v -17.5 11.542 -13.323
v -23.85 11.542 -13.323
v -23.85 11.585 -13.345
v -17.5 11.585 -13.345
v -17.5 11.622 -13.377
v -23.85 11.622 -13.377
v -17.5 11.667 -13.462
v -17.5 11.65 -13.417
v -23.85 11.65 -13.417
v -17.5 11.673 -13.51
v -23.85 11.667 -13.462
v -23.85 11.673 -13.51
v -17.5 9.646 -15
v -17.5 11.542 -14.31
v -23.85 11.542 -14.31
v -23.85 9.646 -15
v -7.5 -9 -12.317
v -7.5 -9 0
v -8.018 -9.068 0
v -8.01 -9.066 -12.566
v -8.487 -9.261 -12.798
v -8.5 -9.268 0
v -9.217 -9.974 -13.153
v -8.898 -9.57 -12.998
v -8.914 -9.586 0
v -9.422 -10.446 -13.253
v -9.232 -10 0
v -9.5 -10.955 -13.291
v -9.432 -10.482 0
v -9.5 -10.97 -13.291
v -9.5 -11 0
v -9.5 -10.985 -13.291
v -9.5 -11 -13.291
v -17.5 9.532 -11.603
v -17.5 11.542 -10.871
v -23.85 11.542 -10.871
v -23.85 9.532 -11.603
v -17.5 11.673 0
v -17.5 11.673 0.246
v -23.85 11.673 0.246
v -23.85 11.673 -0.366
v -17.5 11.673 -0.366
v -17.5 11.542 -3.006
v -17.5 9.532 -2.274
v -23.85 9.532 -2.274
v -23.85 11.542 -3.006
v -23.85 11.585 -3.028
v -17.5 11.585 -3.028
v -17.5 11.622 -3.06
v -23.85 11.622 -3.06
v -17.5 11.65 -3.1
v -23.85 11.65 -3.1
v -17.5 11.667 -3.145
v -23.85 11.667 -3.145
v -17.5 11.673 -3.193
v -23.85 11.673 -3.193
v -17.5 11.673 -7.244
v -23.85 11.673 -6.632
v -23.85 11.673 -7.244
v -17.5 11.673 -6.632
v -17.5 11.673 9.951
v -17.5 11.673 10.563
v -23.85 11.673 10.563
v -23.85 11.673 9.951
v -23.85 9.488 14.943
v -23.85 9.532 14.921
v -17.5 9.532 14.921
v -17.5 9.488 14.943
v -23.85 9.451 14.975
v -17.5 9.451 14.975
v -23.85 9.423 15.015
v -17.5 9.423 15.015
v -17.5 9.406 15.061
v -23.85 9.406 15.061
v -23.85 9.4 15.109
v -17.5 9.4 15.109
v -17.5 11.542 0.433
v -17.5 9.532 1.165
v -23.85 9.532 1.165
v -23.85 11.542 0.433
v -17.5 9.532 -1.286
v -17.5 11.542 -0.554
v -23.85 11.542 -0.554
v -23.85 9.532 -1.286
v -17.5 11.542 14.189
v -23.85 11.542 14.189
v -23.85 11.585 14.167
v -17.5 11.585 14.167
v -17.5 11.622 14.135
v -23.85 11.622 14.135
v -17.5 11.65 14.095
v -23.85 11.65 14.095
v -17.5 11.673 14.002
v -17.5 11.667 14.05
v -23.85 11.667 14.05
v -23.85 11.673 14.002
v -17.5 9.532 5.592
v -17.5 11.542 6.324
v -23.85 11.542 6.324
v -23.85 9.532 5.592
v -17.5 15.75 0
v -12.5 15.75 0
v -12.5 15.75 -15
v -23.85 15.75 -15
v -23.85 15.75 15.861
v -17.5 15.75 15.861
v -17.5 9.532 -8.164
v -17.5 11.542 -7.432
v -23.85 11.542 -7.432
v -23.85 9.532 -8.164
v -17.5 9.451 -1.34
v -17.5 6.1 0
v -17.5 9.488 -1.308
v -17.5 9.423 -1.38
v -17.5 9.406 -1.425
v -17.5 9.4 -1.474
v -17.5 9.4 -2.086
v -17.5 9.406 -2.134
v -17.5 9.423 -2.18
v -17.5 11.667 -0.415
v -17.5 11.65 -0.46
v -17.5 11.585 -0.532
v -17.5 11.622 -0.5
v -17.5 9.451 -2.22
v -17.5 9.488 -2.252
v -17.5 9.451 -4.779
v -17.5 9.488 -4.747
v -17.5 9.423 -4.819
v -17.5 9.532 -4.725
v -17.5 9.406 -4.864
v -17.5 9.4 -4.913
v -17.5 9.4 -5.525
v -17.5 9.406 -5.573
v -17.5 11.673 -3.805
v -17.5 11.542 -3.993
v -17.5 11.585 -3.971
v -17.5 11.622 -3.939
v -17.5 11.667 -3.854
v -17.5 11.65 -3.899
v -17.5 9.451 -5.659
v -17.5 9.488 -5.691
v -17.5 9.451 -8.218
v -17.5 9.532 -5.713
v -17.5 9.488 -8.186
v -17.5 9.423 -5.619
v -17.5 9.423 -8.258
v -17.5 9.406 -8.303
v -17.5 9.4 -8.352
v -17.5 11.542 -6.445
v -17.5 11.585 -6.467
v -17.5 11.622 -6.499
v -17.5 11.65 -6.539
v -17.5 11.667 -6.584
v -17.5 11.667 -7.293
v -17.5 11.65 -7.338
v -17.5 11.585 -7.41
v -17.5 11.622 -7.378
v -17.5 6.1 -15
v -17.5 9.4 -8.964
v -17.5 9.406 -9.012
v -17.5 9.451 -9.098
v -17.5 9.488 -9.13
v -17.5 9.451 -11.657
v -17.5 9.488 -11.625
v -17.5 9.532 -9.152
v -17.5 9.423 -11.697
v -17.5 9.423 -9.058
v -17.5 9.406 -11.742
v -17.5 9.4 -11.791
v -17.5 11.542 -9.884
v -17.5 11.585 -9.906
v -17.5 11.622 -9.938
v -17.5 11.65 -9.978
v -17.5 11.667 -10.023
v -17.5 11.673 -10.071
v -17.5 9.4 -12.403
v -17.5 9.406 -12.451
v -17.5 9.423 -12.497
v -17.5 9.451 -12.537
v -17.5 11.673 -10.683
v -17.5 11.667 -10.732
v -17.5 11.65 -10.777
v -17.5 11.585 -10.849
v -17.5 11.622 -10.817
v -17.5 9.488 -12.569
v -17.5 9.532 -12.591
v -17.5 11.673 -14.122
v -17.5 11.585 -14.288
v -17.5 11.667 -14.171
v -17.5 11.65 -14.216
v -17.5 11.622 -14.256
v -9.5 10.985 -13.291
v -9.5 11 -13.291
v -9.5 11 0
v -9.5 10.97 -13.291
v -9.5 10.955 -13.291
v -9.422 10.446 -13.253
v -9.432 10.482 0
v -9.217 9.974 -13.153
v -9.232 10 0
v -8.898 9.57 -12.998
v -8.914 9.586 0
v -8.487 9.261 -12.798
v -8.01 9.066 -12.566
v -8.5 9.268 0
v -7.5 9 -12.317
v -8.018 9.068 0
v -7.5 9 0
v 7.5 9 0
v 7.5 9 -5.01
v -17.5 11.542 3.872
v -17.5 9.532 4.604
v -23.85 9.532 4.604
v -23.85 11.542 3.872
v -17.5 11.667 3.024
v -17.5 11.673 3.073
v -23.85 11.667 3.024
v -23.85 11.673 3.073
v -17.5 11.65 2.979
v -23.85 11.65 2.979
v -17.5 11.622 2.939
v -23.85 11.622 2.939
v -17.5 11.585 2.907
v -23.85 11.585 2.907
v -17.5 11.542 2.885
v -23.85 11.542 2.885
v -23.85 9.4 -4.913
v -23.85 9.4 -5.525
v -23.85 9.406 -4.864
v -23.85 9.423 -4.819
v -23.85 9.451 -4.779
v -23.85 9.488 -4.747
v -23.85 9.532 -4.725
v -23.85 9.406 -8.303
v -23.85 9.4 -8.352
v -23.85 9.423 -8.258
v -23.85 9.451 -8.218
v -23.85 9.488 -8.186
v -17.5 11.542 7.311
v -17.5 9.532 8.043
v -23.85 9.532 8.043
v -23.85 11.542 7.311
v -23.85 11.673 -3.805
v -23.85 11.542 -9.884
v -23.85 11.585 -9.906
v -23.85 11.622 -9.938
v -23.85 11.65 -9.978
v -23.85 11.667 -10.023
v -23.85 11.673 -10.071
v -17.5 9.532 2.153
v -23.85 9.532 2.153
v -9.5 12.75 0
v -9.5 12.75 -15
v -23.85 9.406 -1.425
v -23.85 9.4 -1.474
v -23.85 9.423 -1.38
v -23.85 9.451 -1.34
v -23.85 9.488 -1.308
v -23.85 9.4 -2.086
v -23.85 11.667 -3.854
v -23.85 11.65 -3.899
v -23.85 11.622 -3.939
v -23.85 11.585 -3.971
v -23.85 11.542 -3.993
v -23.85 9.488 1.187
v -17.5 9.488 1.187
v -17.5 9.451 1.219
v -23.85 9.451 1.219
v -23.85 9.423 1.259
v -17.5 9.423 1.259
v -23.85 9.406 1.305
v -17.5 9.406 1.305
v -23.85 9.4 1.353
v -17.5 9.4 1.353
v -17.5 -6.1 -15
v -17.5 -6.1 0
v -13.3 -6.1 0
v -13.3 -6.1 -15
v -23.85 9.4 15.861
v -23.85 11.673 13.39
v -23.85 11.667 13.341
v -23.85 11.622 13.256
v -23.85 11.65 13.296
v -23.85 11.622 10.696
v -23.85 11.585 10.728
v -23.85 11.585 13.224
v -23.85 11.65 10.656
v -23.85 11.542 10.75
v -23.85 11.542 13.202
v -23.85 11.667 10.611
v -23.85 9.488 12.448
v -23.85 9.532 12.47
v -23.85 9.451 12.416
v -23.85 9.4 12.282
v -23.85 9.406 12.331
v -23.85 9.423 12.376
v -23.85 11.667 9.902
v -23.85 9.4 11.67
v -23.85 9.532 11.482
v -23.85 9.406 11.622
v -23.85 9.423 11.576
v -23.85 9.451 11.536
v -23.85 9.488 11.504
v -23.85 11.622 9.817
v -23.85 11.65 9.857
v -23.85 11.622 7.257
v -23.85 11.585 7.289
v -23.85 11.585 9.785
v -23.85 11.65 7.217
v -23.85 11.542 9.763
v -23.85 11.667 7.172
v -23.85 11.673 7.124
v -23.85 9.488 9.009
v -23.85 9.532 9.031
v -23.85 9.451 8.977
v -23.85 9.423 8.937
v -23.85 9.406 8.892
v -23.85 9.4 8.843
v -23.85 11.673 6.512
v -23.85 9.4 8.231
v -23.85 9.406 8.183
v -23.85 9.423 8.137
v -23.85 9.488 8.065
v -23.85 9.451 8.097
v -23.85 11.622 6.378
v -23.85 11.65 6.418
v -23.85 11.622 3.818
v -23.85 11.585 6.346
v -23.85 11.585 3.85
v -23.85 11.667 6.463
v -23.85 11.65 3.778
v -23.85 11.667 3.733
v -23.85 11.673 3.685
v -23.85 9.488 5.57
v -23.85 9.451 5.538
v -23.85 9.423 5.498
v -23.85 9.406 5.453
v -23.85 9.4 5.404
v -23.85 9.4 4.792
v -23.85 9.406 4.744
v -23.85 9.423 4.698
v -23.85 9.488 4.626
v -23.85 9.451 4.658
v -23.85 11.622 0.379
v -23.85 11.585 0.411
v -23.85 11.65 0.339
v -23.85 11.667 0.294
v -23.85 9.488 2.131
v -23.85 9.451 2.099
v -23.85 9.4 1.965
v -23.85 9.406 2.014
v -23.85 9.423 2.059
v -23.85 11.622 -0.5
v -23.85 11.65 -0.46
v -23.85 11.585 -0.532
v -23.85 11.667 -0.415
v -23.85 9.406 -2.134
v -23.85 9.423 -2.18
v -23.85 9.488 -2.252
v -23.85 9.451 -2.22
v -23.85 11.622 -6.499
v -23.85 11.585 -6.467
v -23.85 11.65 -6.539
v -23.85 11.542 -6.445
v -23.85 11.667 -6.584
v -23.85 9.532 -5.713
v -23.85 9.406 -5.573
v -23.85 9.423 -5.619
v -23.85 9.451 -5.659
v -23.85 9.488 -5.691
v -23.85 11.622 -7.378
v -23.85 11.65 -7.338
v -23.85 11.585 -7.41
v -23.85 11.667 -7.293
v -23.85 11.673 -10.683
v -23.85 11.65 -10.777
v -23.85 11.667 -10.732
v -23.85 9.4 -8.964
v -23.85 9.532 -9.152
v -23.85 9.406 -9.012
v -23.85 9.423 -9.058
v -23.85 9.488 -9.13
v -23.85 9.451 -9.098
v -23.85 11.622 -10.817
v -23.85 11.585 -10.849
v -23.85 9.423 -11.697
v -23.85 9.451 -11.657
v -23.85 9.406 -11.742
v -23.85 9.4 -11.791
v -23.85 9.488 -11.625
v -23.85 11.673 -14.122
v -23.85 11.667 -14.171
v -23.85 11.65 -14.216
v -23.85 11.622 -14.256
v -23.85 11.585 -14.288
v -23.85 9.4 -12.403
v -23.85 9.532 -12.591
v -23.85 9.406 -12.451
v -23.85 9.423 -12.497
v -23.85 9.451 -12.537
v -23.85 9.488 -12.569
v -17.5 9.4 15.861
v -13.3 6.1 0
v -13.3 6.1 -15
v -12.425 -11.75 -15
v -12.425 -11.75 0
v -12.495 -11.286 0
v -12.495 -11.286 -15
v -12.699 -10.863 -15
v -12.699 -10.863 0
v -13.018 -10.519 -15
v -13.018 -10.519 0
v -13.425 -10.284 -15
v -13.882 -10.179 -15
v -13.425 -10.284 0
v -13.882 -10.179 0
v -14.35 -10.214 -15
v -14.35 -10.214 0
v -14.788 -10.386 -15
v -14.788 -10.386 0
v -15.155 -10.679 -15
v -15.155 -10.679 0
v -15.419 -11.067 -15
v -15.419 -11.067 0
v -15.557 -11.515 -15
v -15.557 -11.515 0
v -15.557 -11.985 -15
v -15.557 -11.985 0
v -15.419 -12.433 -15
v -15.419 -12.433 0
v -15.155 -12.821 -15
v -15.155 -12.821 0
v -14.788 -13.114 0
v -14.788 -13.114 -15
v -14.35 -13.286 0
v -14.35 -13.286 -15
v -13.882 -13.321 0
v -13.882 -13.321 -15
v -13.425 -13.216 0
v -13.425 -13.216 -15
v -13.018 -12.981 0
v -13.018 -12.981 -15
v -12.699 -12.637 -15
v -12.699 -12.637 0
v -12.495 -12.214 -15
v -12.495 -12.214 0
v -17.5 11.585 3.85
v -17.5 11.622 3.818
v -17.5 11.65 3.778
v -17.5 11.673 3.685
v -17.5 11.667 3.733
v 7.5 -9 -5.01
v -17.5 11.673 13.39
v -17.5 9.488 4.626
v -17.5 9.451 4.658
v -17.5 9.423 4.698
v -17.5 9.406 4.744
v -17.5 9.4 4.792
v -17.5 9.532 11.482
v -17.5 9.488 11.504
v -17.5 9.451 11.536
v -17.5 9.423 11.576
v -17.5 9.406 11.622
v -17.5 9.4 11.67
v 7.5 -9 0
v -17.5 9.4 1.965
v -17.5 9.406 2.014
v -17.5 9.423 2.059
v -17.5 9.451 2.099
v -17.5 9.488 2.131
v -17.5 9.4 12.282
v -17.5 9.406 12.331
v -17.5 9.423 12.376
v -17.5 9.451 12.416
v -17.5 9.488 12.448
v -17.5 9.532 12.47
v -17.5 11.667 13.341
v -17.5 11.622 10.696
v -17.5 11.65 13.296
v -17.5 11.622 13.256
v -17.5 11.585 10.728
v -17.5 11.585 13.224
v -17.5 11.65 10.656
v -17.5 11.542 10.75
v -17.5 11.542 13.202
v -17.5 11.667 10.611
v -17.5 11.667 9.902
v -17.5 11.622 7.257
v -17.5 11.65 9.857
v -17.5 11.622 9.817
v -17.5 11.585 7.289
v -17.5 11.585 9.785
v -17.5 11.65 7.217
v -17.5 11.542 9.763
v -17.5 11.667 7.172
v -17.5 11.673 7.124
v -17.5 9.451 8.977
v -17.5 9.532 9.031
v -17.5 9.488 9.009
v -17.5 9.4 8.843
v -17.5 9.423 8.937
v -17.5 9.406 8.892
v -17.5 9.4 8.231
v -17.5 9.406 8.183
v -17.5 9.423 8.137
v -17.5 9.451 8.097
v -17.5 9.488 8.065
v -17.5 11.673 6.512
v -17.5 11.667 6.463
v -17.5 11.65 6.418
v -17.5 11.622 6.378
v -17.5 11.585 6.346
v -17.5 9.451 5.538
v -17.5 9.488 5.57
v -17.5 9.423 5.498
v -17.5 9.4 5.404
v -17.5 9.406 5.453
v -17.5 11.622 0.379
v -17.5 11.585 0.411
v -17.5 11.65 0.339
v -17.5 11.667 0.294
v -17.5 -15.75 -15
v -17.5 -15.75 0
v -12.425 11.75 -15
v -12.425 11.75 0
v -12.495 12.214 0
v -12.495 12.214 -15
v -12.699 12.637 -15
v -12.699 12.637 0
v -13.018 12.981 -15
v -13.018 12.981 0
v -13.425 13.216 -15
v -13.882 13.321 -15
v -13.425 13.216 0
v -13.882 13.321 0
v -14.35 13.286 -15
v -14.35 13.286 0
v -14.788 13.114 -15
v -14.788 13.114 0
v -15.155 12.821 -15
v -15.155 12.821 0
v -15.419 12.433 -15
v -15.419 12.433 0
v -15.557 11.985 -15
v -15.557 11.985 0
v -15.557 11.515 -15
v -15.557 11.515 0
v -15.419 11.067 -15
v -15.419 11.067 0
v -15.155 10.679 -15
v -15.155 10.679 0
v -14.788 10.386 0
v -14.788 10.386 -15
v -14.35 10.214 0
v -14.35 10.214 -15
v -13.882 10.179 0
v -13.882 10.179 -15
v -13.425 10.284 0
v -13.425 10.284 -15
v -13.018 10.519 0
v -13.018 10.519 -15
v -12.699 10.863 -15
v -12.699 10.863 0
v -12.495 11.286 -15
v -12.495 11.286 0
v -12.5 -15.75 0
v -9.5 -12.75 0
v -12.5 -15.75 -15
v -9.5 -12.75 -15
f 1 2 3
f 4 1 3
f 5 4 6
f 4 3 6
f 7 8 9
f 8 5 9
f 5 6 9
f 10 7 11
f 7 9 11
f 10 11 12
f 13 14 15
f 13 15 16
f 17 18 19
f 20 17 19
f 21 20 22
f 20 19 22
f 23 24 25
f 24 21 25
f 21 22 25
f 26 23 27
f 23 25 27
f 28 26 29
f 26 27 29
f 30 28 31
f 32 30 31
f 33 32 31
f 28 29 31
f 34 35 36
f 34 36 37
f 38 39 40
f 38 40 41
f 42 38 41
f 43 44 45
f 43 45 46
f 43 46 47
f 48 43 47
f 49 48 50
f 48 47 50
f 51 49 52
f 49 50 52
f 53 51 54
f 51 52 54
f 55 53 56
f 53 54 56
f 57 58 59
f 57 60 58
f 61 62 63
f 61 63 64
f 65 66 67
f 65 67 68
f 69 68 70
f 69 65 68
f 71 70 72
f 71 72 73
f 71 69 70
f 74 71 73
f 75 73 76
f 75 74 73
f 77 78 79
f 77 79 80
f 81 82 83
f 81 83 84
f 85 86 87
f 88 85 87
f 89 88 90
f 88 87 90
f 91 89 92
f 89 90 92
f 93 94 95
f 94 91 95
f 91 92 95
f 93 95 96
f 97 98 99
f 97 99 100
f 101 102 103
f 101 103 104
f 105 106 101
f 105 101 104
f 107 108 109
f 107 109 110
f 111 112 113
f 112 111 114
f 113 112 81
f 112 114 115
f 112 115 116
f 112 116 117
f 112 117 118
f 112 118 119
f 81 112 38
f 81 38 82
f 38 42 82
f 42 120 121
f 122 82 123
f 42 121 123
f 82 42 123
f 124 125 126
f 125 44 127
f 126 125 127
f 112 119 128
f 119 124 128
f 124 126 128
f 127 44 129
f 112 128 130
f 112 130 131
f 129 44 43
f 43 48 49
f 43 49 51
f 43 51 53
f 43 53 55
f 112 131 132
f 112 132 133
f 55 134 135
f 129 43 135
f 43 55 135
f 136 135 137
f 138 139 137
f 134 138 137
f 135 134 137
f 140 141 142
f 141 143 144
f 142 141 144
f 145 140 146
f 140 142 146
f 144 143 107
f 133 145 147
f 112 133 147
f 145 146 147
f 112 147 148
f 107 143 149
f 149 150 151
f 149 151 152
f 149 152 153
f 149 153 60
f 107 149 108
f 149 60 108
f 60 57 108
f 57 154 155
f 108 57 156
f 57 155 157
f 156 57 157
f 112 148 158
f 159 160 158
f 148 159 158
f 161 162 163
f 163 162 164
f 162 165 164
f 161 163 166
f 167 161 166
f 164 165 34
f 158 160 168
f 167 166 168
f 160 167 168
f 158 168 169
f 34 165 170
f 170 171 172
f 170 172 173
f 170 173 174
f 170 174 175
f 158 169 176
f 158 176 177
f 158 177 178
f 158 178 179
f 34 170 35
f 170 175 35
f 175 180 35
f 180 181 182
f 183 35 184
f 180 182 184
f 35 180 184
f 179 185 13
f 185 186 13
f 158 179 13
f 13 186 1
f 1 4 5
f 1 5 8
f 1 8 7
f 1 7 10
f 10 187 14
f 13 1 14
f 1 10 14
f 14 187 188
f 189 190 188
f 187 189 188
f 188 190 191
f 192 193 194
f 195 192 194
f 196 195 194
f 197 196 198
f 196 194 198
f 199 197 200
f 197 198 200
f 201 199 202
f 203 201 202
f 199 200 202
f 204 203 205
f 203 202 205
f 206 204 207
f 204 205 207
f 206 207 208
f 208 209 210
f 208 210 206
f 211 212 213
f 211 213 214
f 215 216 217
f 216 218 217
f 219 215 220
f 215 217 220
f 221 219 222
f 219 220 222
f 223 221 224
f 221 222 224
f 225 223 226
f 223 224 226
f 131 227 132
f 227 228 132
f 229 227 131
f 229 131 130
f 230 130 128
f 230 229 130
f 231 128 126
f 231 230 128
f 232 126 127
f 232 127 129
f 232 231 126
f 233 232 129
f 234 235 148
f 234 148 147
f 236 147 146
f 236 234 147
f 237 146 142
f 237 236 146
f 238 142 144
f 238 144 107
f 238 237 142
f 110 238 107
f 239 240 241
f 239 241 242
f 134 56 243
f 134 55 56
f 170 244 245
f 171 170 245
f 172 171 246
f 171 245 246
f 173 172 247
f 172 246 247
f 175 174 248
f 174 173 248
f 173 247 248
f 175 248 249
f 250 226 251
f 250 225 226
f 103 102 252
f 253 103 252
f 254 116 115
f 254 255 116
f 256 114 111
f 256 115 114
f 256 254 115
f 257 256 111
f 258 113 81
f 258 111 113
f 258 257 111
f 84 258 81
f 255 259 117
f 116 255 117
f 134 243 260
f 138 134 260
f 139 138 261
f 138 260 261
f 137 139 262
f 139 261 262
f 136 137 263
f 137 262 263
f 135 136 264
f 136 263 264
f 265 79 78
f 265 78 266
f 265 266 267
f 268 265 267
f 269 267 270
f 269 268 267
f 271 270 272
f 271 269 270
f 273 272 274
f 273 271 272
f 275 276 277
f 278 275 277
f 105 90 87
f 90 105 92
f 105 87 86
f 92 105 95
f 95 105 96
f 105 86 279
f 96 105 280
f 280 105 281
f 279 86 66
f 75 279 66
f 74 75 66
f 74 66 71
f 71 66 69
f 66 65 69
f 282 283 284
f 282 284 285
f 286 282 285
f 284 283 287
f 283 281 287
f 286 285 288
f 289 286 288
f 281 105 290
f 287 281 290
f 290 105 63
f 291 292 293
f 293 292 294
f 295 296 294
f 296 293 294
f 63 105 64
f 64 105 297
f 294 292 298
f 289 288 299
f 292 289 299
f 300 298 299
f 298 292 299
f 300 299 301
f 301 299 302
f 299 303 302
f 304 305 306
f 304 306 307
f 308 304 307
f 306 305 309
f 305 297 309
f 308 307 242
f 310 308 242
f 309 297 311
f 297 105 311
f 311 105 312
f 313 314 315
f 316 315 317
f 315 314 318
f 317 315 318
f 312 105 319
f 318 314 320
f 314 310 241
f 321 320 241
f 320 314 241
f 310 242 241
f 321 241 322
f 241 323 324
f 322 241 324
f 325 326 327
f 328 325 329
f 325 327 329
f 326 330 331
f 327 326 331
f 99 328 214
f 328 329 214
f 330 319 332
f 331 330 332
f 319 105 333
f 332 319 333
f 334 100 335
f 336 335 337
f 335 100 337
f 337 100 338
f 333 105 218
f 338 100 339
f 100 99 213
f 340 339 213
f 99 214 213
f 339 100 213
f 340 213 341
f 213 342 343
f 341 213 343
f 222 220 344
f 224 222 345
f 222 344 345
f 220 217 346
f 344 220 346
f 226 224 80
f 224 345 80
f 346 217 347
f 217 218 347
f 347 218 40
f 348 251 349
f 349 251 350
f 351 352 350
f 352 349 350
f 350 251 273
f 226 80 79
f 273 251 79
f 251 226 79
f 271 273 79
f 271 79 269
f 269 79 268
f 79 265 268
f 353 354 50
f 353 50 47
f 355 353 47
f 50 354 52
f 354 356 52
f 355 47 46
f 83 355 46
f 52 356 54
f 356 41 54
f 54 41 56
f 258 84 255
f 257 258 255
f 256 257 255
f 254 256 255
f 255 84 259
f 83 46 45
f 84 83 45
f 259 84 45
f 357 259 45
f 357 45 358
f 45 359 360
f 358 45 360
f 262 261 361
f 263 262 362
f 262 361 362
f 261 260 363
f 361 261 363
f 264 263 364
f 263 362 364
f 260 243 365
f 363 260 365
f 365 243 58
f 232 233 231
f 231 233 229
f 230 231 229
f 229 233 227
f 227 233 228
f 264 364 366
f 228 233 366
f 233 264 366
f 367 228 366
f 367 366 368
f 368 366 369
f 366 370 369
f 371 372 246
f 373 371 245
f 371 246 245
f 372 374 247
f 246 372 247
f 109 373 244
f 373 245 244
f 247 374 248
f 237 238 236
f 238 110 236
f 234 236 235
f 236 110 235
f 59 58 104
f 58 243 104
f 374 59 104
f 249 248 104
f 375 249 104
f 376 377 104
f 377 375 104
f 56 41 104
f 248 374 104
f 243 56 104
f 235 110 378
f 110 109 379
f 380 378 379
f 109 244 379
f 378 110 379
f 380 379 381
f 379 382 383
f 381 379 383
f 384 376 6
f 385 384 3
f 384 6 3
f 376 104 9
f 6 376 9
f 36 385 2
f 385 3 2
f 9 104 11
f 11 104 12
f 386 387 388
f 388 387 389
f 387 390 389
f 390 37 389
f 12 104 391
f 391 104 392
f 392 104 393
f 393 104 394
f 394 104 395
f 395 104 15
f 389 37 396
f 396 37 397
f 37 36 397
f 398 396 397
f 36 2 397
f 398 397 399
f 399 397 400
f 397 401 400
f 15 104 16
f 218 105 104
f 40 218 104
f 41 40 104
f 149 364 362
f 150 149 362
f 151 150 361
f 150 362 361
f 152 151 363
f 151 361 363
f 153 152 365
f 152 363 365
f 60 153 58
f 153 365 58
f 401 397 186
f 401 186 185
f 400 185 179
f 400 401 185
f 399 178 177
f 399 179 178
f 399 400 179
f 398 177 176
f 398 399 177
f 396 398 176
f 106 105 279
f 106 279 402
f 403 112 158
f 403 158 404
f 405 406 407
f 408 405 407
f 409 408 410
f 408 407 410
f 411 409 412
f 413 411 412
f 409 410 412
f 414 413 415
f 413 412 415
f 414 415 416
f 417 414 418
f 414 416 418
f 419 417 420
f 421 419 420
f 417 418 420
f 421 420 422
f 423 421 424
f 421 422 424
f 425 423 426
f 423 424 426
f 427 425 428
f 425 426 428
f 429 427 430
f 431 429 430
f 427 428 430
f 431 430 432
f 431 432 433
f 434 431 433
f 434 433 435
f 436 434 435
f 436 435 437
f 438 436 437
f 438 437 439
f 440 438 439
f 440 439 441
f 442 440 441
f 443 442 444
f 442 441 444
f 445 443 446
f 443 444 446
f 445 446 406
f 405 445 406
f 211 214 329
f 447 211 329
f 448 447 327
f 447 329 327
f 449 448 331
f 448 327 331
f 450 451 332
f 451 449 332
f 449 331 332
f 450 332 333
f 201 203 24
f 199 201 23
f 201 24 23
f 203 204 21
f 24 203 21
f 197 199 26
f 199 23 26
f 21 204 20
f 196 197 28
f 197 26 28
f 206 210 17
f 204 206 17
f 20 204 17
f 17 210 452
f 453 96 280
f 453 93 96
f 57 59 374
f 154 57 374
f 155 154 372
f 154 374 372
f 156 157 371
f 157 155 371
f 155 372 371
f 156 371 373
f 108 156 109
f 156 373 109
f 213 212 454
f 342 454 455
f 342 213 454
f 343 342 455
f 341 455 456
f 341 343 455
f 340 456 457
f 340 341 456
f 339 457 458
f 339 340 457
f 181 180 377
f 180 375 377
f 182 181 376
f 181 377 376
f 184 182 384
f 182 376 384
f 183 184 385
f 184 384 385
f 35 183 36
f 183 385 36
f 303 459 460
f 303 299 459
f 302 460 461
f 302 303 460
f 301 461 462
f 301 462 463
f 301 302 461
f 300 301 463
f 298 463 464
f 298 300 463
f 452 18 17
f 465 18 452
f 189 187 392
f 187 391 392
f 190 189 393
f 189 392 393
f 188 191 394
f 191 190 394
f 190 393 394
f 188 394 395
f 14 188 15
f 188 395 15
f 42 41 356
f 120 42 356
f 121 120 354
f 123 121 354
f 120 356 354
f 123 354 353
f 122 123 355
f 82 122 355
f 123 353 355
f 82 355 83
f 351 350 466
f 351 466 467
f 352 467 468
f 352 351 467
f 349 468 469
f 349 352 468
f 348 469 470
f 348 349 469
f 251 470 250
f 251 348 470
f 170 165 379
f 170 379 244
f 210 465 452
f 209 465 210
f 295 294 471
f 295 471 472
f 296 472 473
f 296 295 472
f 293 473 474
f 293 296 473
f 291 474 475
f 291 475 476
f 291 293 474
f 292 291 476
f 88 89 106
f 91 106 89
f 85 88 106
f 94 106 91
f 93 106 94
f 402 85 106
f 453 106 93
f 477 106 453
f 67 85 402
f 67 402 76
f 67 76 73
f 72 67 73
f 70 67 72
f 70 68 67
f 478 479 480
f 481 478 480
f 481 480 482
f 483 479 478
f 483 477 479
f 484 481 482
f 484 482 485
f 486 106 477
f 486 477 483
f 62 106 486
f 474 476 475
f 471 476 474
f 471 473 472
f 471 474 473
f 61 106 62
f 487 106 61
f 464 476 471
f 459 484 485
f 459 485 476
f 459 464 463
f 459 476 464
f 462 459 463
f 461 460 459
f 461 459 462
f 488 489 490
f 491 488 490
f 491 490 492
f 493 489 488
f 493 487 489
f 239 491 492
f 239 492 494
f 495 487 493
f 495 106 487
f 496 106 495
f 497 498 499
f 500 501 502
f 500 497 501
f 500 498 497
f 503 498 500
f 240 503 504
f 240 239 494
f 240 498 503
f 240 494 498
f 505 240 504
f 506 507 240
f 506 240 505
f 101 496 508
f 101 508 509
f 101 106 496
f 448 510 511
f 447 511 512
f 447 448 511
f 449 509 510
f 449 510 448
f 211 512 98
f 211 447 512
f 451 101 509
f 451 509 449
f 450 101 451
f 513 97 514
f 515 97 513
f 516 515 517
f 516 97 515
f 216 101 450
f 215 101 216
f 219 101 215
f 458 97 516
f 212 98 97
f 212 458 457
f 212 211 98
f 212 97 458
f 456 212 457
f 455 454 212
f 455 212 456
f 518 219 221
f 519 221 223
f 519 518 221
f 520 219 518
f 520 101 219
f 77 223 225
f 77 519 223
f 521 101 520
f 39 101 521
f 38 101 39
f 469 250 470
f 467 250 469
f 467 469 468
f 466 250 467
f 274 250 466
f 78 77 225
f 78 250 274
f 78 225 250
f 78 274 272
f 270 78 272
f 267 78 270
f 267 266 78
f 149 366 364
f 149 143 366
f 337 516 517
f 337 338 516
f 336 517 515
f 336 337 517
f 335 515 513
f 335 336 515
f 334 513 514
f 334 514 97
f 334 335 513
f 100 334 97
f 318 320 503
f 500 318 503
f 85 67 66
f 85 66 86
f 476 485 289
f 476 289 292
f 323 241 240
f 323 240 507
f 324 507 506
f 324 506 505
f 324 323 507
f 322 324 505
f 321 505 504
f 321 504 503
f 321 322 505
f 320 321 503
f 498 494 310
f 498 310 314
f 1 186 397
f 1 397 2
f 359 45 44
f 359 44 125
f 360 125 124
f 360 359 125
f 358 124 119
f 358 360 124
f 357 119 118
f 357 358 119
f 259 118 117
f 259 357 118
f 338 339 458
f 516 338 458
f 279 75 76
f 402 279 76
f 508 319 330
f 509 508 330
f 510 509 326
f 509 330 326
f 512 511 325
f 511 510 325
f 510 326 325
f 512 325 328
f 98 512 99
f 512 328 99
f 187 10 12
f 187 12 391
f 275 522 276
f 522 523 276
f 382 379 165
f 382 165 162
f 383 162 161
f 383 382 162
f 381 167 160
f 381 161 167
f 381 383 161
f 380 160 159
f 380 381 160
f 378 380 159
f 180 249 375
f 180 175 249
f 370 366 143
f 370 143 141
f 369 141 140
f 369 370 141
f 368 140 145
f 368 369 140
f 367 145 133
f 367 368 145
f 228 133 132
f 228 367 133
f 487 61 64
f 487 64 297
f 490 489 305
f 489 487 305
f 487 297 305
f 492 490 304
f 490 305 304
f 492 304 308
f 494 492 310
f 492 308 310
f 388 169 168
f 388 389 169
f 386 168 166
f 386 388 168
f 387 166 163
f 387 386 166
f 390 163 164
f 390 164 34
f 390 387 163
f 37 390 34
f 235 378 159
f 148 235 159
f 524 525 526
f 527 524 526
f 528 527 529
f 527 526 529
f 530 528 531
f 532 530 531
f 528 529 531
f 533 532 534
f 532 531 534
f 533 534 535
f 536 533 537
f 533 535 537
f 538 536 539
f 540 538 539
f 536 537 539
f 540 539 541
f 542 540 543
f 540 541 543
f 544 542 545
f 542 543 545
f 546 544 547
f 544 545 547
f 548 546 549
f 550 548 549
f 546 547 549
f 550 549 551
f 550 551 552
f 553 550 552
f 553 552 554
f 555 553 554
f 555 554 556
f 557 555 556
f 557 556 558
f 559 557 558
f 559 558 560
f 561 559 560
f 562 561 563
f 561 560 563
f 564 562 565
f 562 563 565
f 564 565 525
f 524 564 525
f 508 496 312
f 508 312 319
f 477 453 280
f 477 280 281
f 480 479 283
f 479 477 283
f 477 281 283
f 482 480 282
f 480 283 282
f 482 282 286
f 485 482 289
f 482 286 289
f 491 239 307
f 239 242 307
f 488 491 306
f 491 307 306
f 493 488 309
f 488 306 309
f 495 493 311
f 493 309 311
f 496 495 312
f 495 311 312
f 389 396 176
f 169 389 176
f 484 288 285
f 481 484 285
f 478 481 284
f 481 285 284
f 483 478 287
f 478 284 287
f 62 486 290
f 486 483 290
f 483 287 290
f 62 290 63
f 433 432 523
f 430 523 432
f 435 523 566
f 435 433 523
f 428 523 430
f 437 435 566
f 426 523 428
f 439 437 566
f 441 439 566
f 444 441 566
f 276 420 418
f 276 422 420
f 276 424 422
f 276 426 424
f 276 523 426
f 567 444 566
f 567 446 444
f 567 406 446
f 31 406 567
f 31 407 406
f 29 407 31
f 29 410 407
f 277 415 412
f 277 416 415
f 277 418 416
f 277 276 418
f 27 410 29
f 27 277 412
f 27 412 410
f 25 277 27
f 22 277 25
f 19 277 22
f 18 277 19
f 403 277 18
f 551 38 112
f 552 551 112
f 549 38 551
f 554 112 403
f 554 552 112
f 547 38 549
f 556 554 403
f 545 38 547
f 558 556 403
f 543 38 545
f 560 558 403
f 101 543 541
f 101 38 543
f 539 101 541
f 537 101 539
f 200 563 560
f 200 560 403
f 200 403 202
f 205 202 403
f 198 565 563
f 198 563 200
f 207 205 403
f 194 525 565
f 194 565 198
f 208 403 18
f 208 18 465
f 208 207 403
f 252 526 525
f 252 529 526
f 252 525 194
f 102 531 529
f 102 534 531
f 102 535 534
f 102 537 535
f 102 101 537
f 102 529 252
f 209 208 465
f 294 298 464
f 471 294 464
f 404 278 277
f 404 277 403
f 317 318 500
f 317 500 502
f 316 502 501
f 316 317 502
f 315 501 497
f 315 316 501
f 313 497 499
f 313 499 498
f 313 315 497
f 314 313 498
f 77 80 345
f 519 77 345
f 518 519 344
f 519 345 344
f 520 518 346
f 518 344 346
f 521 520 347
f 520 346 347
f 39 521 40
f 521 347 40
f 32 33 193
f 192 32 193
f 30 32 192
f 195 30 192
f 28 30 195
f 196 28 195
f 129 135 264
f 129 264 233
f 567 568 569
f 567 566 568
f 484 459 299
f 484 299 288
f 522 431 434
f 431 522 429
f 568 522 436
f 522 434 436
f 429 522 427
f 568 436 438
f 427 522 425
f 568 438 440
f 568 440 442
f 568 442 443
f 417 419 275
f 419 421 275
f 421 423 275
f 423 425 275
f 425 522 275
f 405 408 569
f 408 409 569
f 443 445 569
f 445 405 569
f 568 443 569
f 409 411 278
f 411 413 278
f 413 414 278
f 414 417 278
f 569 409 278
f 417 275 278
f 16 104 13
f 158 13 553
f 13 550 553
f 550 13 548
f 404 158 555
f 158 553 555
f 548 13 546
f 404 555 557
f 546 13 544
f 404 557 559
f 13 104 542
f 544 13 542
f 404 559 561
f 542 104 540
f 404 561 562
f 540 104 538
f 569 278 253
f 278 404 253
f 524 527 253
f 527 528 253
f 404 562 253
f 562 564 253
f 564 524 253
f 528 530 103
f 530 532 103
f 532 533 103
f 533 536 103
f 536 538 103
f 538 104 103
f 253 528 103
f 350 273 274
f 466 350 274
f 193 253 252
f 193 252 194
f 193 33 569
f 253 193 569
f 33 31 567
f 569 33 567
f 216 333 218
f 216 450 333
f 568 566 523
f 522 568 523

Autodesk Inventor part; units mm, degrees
ref_plane "YZ Plane" through (0, 0, 0) normal (1, 0, 0) x (0, 1, 0)
ref_plane "XZ Plane" through (0, 0, 0) normal (0, 1, 0) x (-1, 0, 0)
sketch "Sketch1" plane through (0, 0, 0) normal (0, 0, 1) x (1, 0, 0)
  line L0 (-7.5, -9) -> (7.5, -9)
  line L1 (7.5, -9) -> (7.5, 9)
  line L2 (7.5, 9) -> (-7.5, 9)
  line L3 (-9.5, -11) -> (-9.5, -12.75)
  line L4 (-12.5, -15.75) -> (-17.5, -15.75)
  arc A0 (-7.5, -9) -> (-9.5, -11) centre (-7.5, -11) ccw
  line L5 (-12.5, -15.75) -> (-9.5, -12.75)
  line L6 (-17.5, -15.75) -> (-17.5, -6.1)
  line L7 (-17.5, -6.1) -> (-13.3, -6.1)
  line L8 (-13.3, -6.1) -> (-13.3, 0)
  line L9 (2.7531, 0) -> (-2.7531, 0) construction
  line L10 (-9.5, 11) -> (-9.5, 12.75)
  line L11 (-12.5, 15.75) -> (-17.5, 15.75)
  arc A1 (-9.5, 11) -> (-7.5, 9) centre (-7.5, 11) ccw
  line L12 (-12.5, 15.75) -> (-9.5, 12.75)
  line L13 (-17.5, 15.75) -> (-17.5, 6.1)
  line L14 (-17.5, 6.1) -> (-13.3, 6.1)
  line L15 (-13.3, 6.1) -> (-13.3, 0)
  circle A2 centre (-14, -11.75) radius 1.575
  circle A3 centre (-14, 11.75) radius 1.575
  line L16 (-17.5, 15.75) -> (-23.85, 15.75)
  line L17 (-23.85, 15.75) -> (-23.85, 9.4)
  line L18 (-23.85, 9.4) -> (-17.5, 9.4)
  line L19 (-9.5, 11.875) -> (-9.5, -11.875)
  point P0 (0, 0)
  point P1 (0, 0)
  point P2 (7.5, 0)
  point P3 (0, -9)
  point P4 (-9.5, -15.75)
  point P5 (0, 0)
  point P6 (-9.5, 15.75)
  dimension "d1" = 18
  dimension "d3" = 8
  dimension "d4" = 2
  dimension "d5" = 3
  dimension "d6" = 3
  dimension "d7" = 9.65
  dimension "d8" = 4.2
  dimension "d9" = 6.1
  dimension "d10" = 7.5
  dimension "d11" = 3.875
  dimension "d12" = 3.15
  dimension "d13" = 3.5
  dimension "d14" = 4
  dimension "d15" = 6.35
  dimension "d16" = 6.35
extrude "Extrusion1" add sketch "Sketch1" against normal blind 15 contours L3 L5 L4 L6 L7 L8 L15 L14 L13 L11 L12 L10 L19
extrude "Extrusion2" add sketch "Sketch1" against normal blind 13.291 contours A0 L19 A1 L2 L1 L0
chamfer "Chamfer1" distance 17 distance2 8.281 1 edges at (7.5, 0, -13.291) measured on face at (-2.5, 3, -13.291)
extrude "Extrusion3" add sketch "Sketch1" along normal blind 15.861 and the other way blind 15 contours L13 L18 L17 L16
ref_plane "Work Plane1" through (-17.5, 9.4, 0) normal (1, 0, 0) x (0, 0, -1)
sketch "Sketch2" plane through (-17.5, 9.4, 0) normal (1, 0, 0) x (0, 0, -1)
  line L0 (0, 6.35) -> (0, 0) projected
  line L1 (15, 0) -> (0, 0) projected
  line L2 (15, 6.35) -> (15, 0) projected
  line L3 (0, 6.35) -> (15, 6.35) projected
  line L4 (-15.861, 6.35) -> (0, 6.35) projected
  line L5 (-15.861, 0) -> (-15.861, 6.35) projected
  line L6 (0, 0) -> (-15.861, 0) projected
  line L7 (0, -3.3) -> (0, 0) projected
  line L8 (15, -3.3) -> (0, -3.3) projected
  line L9 (15, 0) -> (15, -3.3) projected
  line L10 (0, -15.5) -> (15, -15.5) projected
  line L11 (15, -15.5) -> (15, -25.15) projected
  line L12 (15, -25.15) -> (0, -25.15) projected
  line L13 (0, -25.15) -> (0, -15.5) projected
  line L14 (-15.861, 0) -> (-14.969, 0)
  line L15 (-14.969, 0) -> (-14.1416, 2.2732)
  line L16 (-14.1416, 2.2732) -> (-13.2496, 2.2732)
  line L17 (-13.2496, 2.2732) -> (-12.4223, 0)
  line L18 (-15.861, 0) -> (15, 0) projected
  line L19 (-9.8106, 2.2732) -> (-8.9833, 0)
  line L20 (-10.7026, 2.2732) -> (-9.8106, 2.2732)
  line L21 (-11.53, 0) -> (-10.7026, 2.2732)
  line L22 (-12.422, 0) -> (-11.53, 0)
  line L23 (-6.3716, 2.2732) -> (-5.5443, 0)
  line L24 (-7.2636, 2.2732) -> (-6.3716, 2.2732)
  line L25 (-8.091, 0) -> (-7.2636, 2.2732)
  line L26 (-8.983, 0) -> (-8.091, 0)
  line L27 (-2.9326, 2.2732) -> (-2.1053, 0)
  line L28 (-3.8246, 2.2732) -> (-2.9326, 2.2732)
  line L29 (-4.652, 0) -> (-3.8246, 2.2732)
  line L30 (-5.544, 0) -> (-4.652, 0)
  line L31 (0.5064, 2.2732) -> (1.3337, 0)
  line L32 (-0.3856, 2.2732) -> (0.5064, 2.2732)
  line L33 (-1.213, 0) -> (-0.3856, 2.2732)
  line L34 (-2.105, 0) -> (-1.213, 0)
  line L35 (3.9454, 2.2732) -> (4.7727, 0)
  line L36 (3.0534, 2.2732) -> (3.9454, 2.2732)
  line L37 (2.226, 0) -> (3.0534, 2.2732)
  line L38 (1.334, 0) -> (2.226, 0)
  line L39 (7.3844, 2.2732) -> (8.2117, 0)
  line L40 (6.4924, 2.2732) -> (7.3844, 2.2732)
  line L41 (5.665, 0) -> (6.4924, 2.2732)
  line L42 (4.773, 0) -> (5.665, 0)
  line L43 (10.8234, 2.2732) -> (11.6507, 0)
  line L44 (9.9314, 2.2732) -> (10.8234, 2.2732)
  line L45 (9.104, 0) -> (9.9314, 2.2732)
  line L46 (8.212, 0) -> (9.104, 0)
  line L47 (14.2624, 2.2732) -> (15.0897, 0)
  line L48 (13.3704, 2.2732) -> (14.2624, 2.2732)
  line L49 (12.543, 0) -> (13.3704, 2.2732)
  line L50 (11.651, 0) -> (12.543, 0)
  point P0 (0, -9.4)
  point P1 (15, 0.2465)
  point P2 (11.6507, 0)
  point P3 (8.2117, 0)
  point P4 (4.7727, 0)
  point P5 (1.3337, 0)
  point P6 (-2.1053, 0)
  point P7 (-5.5443, 0)
  point P8 (-8.9833, 0)
  point P9 (-12.4223, 0)
  dimension "d29" = 0.892
  dimension "d30" = 110
  dimension "d31" = 110
  dimension "d32" = 0.892
  dimension "d33" = 2.2732
  dimension "d36" = 3.439
extrude "Extrusion4" cut sketch "Sketch2" against normal up to surface (6.35 mm away) contours L32 L31 L1 L0 | L0 L6 L33 L32 | L2 L1 L49 L48 L47 | L15 L16 L17 L6 | L37 L36 L35 L1 | L6 L29 L28 L27 | L1 L45 L44 L43 | L21 L20 L19 L6 | L41 L40 L39 L1 | L6 L25 L24 L23
fillet "Fillet1" radius 0.2 35 edges at (-20.675, 11.6732, 14.1416) (-20.675, 11.6732, 13.2496) (-20.675, 9.4, 14.969) (-20.675, 9.4, 12.4223) (-20.675, 9.4, 11.53) (-20.675, 11.6732, 10.7026) (-20.675, 11.6732, 9.8106) (-20.675, 9.4, 8.9833) (-20.675, 9.4, 8.091) (-20.675, 11.6732, 7.2636) (-20.675, 11.6732, 6.3716) (-20.675, 9.4, 5.5443) (-20.675, 9.4, 4.652) (-20.675, 11.6732, 3.8246) (-20.675, 11.6732, 2.9326) (-20.675, 9.4, 2.1053) (-20.675, 9.4, 1.213) (-20.675, 11.6732, 0.3856) (-20.675, 11.6732, -0.5064) (-20.675, 9.4, -1.3337) (-20.675, 9.4, -2.226) (-20.675, 11.6732, -3.0534) (-20.675, 11.6732, -3.9454) (-20.675, 9.4, -4.7727) (-20.675, 9.4, -5.665) (-20.675, 11.6732, -6.4924) (-20.675, 11.6732, -7.3844) (-20.675, 9.4, -8.2117) (-20.675, 9.4, -9.104) (-20.675, 11.6732, -9.9314) (-20.675, 11.6732, -10.8234) (-20.675, 9.4, -11.6507) (-20.675, 9.4, -12.543) (-20.675, 11.6732, -13.3704) (-20.675, 11.6732, -14.2624)
equation "\"d6\" = d5"
properties part number "GA_1"
